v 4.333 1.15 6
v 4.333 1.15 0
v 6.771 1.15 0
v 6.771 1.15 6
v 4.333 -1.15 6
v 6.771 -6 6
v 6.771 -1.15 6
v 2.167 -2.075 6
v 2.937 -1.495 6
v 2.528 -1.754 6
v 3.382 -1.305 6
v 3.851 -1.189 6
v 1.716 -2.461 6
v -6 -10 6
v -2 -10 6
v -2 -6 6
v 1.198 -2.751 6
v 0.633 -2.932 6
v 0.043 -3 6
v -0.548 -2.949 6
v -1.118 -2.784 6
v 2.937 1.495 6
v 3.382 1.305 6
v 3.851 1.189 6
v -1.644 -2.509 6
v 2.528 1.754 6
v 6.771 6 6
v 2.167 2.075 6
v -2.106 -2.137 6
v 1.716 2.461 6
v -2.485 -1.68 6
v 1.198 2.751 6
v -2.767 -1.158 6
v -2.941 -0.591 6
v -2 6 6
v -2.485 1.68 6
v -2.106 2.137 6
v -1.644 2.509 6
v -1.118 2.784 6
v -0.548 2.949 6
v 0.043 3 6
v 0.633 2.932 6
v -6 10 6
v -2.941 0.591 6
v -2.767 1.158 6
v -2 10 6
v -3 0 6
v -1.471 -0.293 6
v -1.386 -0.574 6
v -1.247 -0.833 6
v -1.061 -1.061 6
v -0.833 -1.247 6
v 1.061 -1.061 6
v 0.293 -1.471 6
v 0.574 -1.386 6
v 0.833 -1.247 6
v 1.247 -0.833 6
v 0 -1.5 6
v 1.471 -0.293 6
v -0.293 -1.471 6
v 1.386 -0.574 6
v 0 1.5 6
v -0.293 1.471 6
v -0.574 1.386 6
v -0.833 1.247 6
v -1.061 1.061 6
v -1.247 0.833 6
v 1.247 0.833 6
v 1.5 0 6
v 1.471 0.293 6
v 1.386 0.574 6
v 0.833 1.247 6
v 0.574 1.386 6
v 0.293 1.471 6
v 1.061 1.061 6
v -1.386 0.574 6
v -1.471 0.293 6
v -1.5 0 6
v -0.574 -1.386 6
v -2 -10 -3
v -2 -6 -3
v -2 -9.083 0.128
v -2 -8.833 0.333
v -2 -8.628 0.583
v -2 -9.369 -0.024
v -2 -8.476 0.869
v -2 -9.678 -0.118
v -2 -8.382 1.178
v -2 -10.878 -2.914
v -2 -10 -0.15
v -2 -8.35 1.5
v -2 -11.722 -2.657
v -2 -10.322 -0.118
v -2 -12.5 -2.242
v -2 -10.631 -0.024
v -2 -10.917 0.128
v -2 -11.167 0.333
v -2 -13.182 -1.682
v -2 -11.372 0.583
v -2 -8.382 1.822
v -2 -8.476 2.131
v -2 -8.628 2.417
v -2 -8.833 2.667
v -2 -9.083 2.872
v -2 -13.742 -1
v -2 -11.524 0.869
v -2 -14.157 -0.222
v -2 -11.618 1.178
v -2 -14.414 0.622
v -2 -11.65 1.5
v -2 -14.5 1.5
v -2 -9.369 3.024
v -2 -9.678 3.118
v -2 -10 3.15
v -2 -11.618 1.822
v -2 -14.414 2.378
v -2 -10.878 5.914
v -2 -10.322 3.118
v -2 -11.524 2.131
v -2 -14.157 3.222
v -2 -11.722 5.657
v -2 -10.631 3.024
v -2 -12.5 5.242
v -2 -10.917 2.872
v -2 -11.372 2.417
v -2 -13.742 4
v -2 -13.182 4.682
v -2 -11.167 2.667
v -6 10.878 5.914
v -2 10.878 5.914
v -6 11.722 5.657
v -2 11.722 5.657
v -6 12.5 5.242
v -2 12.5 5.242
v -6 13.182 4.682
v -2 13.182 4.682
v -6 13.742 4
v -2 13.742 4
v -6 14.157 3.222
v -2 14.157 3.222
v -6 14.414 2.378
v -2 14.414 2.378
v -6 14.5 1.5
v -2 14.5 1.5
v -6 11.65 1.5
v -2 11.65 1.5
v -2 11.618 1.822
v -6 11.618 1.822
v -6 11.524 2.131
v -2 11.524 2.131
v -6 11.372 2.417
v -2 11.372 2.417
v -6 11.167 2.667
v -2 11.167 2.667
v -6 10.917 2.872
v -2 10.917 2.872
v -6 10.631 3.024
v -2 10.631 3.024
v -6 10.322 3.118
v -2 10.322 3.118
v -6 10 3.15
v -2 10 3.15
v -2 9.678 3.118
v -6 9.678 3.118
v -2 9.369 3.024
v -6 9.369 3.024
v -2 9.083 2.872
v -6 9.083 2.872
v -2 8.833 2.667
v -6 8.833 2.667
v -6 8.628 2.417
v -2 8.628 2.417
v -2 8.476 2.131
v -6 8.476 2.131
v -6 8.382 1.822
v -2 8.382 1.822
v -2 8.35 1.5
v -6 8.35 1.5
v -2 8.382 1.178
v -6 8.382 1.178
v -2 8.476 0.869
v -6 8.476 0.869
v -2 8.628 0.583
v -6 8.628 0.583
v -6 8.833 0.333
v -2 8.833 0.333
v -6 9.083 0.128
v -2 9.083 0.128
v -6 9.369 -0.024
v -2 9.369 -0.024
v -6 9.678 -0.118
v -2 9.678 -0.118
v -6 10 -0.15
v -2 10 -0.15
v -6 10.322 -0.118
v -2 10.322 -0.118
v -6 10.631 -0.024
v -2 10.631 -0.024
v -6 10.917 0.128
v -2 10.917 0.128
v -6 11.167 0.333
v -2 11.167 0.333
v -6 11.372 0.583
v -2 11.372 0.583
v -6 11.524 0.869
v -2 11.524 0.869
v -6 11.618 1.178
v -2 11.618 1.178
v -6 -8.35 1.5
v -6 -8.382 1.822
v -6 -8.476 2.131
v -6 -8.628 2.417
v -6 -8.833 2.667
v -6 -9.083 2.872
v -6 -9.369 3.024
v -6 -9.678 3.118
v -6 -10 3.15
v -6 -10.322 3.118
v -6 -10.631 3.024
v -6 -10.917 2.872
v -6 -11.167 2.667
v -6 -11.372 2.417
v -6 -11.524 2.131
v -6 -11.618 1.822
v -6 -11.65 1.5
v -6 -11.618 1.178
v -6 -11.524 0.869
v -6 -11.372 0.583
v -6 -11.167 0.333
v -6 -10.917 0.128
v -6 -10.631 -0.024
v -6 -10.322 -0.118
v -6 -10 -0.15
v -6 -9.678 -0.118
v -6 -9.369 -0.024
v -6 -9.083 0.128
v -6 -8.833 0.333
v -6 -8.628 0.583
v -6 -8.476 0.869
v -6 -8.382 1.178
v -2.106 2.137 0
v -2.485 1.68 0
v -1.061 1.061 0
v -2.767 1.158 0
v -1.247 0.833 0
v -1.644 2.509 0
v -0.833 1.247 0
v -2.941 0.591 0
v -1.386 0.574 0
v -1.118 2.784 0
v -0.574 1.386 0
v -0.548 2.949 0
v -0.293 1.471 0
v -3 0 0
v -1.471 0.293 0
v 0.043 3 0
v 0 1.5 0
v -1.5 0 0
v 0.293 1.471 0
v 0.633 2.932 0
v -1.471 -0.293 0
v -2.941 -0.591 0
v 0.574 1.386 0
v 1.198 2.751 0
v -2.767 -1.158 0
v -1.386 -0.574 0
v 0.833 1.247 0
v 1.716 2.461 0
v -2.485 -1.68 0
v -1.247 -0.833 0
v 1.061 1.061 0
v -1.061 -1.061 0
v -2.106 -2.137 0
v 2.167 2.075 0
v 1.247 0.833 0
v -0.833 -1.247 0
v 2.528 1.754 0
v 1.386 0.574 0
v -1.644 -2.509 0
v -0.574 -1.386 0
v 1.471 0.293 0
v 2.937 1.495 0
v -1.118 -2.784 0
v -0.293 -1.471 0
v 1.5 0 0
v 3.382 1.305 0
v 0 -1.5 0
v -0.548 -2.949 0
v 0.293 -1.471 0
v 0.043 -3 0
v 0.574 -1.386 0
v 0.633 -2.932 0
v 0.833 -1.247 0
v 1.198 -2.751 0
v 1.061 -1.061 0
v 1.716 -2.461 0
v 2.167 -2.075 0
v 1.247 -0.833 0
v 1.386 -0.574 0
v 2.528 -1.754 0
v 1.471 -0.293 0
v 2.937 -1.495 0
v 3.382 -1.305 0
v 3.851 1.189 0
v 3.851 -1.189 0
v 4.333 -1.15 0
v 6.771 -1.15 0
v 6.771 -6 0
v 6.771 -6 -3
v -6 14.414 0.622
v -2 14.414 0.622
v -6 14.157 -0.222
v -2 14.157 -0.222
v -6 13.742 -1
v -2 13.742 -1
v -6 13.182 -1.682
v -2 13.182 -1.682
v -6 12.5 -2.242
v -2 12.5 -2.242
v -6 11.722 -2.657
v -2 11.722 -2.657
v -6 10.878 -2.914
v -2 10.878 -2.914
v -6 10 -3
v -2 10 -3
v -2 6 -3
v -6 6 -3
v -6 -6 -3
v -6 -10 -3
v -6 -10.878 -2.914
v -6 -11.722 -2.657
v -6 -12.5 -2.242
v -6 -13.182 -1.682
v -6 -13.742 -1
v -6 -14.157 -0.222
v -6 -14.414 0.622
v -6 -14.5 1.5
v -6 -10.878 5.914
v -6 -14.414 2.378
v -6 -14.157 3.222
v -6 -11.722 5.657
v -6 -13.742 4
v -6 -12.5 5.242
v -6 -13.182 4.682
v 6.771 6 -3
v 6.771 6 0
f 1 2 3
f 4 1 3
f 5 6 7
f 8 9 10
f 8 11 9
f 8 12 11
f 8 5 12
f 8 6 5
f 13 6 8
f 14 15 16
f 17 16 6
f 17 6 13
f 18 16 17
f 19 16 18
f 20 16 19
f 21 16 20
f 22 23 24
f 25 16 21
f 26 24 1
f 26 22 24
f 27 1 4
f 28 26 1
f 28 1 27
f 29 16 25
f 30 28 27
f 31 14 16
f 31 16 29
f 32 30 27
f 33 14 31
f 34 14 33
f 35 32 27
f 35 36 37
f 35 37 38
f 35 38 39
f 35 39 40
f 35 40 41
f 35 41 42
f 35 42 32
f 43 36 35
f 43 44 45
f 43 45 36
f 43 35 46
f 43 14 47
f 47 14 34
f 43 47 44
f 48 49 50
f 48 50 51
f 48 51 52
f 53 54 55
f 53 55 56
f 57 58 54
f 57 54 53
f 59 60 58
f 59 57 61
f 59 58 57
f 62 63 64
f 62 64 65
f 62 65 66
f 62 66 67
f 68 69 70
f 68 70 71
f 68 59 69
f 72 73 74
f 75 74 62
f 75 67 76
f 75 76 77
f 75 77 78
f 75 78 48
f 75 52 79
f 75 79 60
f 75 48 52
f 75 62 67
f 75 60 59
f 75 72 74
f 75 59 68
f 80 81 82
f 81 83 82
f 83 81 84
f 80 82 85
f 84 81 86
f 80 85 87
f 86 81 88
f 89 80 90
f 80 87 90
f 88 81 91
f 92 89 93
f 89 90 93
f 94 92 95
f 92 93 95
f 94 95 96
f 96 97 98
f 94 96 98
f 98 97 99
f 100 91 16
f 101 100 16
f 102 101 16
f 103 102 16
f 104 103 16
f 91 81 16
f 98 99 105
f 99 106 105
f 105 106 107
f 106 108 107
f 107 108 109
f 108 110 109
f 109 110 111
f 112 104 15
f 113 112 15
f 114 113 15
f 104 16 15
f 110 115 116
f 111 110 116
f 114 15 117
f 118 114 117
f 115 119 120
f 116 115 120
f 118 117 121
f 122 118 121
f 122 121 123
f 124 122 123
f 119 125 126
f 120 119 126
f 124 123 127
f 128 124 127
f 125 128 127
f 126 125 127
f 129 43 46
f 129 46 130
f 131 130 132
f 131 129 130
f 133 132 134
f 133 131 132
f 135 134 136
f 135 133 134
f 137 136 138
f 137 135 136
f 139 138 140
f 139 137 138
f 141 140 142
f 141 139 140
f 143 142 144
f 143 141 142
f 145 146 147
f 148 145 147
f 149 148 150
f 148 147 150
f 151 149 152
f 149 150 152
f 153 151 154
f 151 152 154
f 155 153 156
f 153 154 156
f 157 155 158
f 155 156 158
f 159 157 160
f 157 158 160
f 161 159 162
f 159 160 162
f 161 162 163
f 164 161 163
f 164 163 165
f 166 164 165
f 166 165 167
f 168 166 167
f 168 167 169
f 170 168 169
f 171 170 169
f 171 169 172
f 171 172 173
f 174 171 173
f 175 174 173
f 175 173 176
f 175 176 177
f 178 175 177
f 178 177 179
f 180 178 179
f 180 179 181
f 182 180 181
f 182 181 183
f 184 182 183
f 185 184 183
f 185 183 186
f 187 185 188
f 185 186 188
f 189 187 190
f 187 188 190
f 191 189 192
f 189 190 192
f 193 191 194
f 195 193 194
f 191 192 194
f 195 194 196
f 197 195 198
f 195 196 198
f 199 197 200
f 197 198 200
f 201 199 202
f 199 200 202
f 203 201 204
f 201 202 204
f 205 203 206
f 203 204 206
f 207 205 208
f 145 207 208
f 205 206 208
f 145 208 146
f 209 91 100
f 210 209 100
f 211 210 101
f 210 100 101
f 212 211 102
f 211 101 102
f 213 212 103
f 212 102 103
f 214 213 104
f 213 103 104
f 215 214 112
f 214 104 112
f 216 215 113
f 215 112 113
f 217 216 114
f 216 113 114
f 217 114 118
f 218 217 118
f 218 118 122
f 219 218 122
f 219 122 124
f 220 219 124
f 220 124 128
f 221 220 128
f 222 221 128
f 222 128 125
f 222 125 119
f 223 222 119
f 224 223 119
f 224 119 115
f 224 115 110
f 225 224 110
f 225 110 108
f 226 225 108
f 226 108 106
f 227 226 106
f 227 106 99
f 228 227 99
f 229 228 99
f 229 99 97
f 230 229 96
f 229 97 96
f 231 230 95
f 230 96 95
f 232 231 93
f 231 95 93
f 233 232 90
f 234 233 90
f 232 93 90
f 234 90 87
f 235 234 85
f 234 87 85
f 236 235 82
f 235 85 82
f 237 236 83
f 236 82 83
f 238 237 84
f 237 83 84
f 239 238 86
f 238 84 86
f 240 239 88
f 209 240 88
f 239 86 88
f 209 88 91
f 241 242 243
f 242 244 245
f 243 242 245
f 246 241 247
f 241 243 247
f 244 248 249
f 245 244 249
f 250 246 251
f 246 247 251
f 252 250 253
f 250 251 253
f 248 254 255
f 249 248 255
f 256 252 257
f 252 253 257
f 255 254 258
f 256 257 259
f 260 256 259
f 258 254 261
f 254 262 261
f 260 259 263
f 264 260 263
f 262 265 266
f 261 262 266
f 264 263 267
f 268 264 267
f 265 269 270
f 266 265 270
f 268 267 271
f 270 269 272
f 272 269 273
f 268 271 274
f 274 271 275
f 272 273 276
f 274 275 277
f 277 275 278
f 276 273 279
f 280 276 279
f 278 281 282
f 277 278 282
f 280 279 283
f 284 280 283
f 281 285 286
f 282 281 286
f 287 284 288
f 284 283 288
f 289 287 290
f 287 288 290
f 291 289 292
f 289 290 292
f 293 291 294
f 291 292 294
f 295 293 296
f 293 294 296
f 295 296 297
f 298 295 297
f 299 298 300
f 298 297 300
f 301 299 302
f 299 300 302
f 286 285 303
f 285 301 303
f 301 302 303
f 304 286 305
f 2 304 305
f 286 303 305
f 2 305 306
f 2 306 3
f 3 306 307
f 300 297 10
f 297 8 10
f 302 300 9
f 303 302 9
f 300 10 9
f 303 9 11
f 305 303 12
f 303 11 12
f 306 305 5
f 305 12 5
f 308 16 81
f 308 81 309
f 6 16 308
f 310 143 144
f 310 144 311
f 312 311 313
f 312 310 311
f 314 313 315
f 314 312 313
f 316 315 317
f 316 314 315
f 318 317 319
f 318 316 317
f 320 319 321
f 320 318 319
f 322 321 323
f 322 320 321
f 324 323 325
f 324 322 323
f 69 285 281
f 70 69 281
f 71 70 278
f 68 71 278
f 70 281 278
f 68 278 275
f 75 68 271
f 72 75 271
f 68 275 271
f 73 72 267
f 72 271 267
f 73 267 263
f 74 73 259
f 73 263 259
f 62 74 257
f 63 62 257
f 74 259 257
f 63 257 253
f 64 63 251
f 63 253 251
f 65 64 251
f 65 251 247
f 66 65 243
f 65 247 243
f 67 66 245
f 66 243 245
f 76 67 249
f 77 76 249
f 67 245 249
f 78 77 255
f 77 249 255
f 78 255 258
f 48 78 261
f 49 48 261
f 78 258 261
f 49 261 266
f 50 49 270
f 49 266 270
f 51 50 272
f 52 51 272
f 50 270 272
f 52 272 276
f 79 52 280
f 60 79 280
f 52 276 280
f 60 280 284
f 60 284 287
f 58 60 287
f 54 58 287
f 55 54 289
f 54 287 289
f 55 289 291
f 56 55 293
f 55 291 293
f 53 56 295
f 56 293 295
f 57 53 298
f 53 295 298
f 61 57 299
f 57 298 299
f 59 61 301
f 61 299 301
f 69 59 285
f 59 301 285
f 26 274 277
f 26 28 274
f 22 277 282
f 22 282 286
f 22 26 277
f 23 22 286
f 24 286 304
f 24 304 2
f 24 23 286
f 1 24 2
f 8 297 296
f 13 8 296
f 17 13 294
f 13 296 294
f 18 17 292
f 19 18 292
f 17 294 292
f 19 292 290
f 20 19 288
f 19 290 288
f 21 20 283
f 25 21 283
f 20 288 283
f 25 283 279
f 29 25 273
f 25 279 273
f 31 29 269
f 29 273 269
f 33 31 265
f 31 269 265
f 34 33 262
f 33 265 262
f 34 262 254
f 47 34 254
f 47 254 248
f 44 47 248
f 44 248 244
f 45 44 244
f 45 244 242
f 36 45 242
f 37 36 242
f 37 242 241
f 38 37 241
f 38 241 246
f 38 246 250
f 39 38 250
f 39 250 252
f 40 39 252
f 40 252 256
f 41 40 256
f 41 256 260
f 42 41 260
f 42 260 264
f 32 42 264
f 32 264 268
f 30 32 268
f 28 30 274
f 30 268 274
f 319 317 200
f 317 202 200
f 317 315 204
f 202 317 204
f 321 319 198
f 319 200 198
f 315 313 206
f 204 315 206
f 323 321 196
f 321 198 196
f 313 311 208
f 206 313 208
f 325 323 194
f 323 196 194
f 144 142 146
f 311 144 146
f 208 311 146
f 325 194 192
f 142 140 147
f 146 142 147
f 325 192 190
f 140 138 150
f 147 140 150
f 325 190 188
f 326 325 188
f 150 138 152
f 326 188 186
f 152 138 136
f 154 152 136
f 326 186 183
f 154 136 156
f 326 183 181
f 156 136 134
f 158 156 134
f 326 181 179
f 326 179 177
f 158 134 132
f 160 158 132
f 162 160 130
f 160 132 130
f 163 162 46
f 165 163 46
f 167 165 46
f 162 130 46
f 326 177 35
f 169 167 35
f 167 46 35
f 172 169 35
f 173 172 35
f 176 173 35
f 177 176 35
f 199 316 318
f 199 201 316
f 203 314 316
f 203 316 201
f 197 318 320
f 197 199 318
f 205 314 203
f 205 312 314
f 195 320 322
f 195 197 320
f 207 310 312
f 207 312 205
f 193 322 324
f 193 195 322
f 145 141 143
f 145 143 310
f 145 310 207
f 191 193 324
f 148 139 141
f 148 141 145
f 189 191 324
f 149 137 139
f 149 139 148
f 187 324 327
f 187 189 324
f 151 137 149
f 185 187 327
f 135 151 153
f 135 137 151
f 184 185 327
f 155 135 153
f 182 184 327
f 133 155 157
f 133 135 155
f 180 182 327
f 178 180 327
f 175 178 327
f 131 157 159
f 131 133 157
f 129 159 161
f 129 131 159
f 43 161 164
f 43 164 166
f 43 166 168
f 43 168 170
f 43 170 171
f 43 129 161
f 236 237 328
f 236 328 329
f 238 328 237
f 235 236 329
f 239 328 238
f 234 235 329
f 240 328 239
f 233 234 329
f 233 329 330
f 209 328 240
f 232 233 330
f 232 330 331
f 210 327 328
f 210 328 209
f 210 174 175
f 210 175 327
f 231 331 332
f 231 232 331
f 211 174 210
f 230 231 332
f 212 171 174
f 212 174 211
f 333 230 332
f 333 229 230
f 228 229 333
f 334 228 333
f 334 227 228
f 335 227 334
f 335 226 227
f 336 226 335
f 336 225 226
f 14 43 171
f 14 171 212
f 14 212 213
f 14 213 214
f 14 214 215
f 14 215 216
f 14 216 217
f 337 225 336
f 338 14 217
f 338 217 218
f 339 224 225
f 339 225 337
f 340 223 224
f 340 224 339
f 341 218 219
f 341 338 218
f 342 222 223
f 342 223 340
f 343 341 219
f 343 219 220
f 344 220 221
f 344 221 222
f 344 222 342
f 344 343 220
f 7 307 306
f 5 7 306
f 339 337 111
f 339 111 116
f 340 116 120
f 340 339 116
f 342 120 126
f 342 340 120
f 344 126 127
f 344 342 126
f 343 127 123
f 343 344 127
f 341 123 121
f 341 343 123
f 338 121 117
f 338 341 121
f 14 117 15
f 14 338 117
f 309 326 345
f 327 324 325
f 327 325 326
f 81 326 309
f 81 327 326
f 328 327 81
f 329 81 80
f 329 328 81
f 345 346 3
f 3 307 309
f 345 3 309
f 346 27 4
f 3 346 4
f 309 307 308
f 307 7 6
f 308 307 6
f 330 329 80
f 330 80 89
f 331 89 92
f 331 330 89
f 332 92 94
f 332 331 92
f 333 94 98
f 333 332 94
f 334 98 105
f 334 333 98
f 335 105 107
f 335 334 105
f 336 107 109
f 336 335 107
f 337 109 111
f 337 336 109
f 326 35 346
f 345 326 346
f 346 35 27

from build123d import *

# Parameters (mm, degrees)
F1_DEPTH = 6
F0_R     = 1.5
F2_W     = 12.7708302005
F2_H     = 12
F3_DEPTH = 3
F4_R     = 3
F6_DEPTH = 4
F7_D     = 3.3


with BuildPart() as f1:
    # F0 (on Top) → F1 (new body)
    with BuildSketch(Plane.XY):
        with BuildLine():
            ThreePointArc((2.7708302005, -1.15), (-3, 0), (2.7708302005, 1.15))
            Line((2.7708302005, 1.15), (6.7708302005, 1.15))
            Line((6.7708302005, 1.15), (6.7708302005, 6))
            Line((6.7708302005, 6), (-6, 6))
            Line((-6, 6), (-6, 0))
            Line((-6, 0), (-6, -6))
            Line((-6, -6), (6.7708302005, -6))
            Line((6.7708302005, -6), (6.7708302005, -1.15))
            Line((6.7708302005, -1.15), (2.7708302005, -1.15))
        make_face()
    extrude(amount=F1_DEPTH)



with BuildPart() as f1b:
    # F0 (on Top) → F1, piece 2 (new body)
    with BuildSketch(Plane.XY):
        Circle(F0_R)
    extrude(amount=F1_DEPTH)


with BuildPart() as f1_1:
    add(f1.part)

    add(f1b.part)  # F3 merges F1b
    # F2 (on face) → F3 (join)
    with BuildSketch(Plane(origin=(0, 0, 0), x_dir=(1, 0, 0), z_dir=(0, 0, -1))):
        with Locations((0.3854151002, 0)):
            Rectangle(F2_W, F2_H)
    extrude(amount=F3_DEPTH)

    # F4
    f4_edges = [f1_1.edges().sort_by_distance(p)[0] for p in [
        (2.77083, -1.15, 3),
        (2.77083, 1.15, 3),
    ]]
    fillet(f4_edges, radius=F4_R)

    # F5 (on face) → F6 (join)
    with BuildSketch(Plane(origin=(-6, 0, 0), x_dir=(0, -1, 0), z_dir=(-1, 0, 0))):
        with BuildLine():
            Line((-6, -3), (-6, 6))
            Line((-6, 6), (-10, 6))
            ThreePointArc((-10, 6), (-13.1819805153, 4.6819805153), (-14.5, 1.5))
            ThreePointArc((-14.5, 1.5), (-13.1819805153, -1.6819805153), (-10, -3))
            Line((-10, -3), (-6, -3))
        make_face()
        with BuildLine():
            Line((10, 6), (6, 6))
            Line((6, 6), (6, -3))
            Line((6, -3), (10, -3))
            ThreePointArc((10, -3), (13.1819805153, -1.6819805153), (14.5, 1.5))
            ThreePointArc((14.5, 1.5), (13.1819805153, 4.6819805153), (10, 6))
        make_face()
    extrude(amount=-F6_DEPTH)

    # F7 (through all)
    with Locations(Plane(origin=(-6, 0, 0), x_dir=(0, -1, 0), z_dir=(-1, 0, 0))):
        with Locations((-10, 1.5), (10, 1.5)):
            Hole(F7_D / 2)


solid = f1_1.part
